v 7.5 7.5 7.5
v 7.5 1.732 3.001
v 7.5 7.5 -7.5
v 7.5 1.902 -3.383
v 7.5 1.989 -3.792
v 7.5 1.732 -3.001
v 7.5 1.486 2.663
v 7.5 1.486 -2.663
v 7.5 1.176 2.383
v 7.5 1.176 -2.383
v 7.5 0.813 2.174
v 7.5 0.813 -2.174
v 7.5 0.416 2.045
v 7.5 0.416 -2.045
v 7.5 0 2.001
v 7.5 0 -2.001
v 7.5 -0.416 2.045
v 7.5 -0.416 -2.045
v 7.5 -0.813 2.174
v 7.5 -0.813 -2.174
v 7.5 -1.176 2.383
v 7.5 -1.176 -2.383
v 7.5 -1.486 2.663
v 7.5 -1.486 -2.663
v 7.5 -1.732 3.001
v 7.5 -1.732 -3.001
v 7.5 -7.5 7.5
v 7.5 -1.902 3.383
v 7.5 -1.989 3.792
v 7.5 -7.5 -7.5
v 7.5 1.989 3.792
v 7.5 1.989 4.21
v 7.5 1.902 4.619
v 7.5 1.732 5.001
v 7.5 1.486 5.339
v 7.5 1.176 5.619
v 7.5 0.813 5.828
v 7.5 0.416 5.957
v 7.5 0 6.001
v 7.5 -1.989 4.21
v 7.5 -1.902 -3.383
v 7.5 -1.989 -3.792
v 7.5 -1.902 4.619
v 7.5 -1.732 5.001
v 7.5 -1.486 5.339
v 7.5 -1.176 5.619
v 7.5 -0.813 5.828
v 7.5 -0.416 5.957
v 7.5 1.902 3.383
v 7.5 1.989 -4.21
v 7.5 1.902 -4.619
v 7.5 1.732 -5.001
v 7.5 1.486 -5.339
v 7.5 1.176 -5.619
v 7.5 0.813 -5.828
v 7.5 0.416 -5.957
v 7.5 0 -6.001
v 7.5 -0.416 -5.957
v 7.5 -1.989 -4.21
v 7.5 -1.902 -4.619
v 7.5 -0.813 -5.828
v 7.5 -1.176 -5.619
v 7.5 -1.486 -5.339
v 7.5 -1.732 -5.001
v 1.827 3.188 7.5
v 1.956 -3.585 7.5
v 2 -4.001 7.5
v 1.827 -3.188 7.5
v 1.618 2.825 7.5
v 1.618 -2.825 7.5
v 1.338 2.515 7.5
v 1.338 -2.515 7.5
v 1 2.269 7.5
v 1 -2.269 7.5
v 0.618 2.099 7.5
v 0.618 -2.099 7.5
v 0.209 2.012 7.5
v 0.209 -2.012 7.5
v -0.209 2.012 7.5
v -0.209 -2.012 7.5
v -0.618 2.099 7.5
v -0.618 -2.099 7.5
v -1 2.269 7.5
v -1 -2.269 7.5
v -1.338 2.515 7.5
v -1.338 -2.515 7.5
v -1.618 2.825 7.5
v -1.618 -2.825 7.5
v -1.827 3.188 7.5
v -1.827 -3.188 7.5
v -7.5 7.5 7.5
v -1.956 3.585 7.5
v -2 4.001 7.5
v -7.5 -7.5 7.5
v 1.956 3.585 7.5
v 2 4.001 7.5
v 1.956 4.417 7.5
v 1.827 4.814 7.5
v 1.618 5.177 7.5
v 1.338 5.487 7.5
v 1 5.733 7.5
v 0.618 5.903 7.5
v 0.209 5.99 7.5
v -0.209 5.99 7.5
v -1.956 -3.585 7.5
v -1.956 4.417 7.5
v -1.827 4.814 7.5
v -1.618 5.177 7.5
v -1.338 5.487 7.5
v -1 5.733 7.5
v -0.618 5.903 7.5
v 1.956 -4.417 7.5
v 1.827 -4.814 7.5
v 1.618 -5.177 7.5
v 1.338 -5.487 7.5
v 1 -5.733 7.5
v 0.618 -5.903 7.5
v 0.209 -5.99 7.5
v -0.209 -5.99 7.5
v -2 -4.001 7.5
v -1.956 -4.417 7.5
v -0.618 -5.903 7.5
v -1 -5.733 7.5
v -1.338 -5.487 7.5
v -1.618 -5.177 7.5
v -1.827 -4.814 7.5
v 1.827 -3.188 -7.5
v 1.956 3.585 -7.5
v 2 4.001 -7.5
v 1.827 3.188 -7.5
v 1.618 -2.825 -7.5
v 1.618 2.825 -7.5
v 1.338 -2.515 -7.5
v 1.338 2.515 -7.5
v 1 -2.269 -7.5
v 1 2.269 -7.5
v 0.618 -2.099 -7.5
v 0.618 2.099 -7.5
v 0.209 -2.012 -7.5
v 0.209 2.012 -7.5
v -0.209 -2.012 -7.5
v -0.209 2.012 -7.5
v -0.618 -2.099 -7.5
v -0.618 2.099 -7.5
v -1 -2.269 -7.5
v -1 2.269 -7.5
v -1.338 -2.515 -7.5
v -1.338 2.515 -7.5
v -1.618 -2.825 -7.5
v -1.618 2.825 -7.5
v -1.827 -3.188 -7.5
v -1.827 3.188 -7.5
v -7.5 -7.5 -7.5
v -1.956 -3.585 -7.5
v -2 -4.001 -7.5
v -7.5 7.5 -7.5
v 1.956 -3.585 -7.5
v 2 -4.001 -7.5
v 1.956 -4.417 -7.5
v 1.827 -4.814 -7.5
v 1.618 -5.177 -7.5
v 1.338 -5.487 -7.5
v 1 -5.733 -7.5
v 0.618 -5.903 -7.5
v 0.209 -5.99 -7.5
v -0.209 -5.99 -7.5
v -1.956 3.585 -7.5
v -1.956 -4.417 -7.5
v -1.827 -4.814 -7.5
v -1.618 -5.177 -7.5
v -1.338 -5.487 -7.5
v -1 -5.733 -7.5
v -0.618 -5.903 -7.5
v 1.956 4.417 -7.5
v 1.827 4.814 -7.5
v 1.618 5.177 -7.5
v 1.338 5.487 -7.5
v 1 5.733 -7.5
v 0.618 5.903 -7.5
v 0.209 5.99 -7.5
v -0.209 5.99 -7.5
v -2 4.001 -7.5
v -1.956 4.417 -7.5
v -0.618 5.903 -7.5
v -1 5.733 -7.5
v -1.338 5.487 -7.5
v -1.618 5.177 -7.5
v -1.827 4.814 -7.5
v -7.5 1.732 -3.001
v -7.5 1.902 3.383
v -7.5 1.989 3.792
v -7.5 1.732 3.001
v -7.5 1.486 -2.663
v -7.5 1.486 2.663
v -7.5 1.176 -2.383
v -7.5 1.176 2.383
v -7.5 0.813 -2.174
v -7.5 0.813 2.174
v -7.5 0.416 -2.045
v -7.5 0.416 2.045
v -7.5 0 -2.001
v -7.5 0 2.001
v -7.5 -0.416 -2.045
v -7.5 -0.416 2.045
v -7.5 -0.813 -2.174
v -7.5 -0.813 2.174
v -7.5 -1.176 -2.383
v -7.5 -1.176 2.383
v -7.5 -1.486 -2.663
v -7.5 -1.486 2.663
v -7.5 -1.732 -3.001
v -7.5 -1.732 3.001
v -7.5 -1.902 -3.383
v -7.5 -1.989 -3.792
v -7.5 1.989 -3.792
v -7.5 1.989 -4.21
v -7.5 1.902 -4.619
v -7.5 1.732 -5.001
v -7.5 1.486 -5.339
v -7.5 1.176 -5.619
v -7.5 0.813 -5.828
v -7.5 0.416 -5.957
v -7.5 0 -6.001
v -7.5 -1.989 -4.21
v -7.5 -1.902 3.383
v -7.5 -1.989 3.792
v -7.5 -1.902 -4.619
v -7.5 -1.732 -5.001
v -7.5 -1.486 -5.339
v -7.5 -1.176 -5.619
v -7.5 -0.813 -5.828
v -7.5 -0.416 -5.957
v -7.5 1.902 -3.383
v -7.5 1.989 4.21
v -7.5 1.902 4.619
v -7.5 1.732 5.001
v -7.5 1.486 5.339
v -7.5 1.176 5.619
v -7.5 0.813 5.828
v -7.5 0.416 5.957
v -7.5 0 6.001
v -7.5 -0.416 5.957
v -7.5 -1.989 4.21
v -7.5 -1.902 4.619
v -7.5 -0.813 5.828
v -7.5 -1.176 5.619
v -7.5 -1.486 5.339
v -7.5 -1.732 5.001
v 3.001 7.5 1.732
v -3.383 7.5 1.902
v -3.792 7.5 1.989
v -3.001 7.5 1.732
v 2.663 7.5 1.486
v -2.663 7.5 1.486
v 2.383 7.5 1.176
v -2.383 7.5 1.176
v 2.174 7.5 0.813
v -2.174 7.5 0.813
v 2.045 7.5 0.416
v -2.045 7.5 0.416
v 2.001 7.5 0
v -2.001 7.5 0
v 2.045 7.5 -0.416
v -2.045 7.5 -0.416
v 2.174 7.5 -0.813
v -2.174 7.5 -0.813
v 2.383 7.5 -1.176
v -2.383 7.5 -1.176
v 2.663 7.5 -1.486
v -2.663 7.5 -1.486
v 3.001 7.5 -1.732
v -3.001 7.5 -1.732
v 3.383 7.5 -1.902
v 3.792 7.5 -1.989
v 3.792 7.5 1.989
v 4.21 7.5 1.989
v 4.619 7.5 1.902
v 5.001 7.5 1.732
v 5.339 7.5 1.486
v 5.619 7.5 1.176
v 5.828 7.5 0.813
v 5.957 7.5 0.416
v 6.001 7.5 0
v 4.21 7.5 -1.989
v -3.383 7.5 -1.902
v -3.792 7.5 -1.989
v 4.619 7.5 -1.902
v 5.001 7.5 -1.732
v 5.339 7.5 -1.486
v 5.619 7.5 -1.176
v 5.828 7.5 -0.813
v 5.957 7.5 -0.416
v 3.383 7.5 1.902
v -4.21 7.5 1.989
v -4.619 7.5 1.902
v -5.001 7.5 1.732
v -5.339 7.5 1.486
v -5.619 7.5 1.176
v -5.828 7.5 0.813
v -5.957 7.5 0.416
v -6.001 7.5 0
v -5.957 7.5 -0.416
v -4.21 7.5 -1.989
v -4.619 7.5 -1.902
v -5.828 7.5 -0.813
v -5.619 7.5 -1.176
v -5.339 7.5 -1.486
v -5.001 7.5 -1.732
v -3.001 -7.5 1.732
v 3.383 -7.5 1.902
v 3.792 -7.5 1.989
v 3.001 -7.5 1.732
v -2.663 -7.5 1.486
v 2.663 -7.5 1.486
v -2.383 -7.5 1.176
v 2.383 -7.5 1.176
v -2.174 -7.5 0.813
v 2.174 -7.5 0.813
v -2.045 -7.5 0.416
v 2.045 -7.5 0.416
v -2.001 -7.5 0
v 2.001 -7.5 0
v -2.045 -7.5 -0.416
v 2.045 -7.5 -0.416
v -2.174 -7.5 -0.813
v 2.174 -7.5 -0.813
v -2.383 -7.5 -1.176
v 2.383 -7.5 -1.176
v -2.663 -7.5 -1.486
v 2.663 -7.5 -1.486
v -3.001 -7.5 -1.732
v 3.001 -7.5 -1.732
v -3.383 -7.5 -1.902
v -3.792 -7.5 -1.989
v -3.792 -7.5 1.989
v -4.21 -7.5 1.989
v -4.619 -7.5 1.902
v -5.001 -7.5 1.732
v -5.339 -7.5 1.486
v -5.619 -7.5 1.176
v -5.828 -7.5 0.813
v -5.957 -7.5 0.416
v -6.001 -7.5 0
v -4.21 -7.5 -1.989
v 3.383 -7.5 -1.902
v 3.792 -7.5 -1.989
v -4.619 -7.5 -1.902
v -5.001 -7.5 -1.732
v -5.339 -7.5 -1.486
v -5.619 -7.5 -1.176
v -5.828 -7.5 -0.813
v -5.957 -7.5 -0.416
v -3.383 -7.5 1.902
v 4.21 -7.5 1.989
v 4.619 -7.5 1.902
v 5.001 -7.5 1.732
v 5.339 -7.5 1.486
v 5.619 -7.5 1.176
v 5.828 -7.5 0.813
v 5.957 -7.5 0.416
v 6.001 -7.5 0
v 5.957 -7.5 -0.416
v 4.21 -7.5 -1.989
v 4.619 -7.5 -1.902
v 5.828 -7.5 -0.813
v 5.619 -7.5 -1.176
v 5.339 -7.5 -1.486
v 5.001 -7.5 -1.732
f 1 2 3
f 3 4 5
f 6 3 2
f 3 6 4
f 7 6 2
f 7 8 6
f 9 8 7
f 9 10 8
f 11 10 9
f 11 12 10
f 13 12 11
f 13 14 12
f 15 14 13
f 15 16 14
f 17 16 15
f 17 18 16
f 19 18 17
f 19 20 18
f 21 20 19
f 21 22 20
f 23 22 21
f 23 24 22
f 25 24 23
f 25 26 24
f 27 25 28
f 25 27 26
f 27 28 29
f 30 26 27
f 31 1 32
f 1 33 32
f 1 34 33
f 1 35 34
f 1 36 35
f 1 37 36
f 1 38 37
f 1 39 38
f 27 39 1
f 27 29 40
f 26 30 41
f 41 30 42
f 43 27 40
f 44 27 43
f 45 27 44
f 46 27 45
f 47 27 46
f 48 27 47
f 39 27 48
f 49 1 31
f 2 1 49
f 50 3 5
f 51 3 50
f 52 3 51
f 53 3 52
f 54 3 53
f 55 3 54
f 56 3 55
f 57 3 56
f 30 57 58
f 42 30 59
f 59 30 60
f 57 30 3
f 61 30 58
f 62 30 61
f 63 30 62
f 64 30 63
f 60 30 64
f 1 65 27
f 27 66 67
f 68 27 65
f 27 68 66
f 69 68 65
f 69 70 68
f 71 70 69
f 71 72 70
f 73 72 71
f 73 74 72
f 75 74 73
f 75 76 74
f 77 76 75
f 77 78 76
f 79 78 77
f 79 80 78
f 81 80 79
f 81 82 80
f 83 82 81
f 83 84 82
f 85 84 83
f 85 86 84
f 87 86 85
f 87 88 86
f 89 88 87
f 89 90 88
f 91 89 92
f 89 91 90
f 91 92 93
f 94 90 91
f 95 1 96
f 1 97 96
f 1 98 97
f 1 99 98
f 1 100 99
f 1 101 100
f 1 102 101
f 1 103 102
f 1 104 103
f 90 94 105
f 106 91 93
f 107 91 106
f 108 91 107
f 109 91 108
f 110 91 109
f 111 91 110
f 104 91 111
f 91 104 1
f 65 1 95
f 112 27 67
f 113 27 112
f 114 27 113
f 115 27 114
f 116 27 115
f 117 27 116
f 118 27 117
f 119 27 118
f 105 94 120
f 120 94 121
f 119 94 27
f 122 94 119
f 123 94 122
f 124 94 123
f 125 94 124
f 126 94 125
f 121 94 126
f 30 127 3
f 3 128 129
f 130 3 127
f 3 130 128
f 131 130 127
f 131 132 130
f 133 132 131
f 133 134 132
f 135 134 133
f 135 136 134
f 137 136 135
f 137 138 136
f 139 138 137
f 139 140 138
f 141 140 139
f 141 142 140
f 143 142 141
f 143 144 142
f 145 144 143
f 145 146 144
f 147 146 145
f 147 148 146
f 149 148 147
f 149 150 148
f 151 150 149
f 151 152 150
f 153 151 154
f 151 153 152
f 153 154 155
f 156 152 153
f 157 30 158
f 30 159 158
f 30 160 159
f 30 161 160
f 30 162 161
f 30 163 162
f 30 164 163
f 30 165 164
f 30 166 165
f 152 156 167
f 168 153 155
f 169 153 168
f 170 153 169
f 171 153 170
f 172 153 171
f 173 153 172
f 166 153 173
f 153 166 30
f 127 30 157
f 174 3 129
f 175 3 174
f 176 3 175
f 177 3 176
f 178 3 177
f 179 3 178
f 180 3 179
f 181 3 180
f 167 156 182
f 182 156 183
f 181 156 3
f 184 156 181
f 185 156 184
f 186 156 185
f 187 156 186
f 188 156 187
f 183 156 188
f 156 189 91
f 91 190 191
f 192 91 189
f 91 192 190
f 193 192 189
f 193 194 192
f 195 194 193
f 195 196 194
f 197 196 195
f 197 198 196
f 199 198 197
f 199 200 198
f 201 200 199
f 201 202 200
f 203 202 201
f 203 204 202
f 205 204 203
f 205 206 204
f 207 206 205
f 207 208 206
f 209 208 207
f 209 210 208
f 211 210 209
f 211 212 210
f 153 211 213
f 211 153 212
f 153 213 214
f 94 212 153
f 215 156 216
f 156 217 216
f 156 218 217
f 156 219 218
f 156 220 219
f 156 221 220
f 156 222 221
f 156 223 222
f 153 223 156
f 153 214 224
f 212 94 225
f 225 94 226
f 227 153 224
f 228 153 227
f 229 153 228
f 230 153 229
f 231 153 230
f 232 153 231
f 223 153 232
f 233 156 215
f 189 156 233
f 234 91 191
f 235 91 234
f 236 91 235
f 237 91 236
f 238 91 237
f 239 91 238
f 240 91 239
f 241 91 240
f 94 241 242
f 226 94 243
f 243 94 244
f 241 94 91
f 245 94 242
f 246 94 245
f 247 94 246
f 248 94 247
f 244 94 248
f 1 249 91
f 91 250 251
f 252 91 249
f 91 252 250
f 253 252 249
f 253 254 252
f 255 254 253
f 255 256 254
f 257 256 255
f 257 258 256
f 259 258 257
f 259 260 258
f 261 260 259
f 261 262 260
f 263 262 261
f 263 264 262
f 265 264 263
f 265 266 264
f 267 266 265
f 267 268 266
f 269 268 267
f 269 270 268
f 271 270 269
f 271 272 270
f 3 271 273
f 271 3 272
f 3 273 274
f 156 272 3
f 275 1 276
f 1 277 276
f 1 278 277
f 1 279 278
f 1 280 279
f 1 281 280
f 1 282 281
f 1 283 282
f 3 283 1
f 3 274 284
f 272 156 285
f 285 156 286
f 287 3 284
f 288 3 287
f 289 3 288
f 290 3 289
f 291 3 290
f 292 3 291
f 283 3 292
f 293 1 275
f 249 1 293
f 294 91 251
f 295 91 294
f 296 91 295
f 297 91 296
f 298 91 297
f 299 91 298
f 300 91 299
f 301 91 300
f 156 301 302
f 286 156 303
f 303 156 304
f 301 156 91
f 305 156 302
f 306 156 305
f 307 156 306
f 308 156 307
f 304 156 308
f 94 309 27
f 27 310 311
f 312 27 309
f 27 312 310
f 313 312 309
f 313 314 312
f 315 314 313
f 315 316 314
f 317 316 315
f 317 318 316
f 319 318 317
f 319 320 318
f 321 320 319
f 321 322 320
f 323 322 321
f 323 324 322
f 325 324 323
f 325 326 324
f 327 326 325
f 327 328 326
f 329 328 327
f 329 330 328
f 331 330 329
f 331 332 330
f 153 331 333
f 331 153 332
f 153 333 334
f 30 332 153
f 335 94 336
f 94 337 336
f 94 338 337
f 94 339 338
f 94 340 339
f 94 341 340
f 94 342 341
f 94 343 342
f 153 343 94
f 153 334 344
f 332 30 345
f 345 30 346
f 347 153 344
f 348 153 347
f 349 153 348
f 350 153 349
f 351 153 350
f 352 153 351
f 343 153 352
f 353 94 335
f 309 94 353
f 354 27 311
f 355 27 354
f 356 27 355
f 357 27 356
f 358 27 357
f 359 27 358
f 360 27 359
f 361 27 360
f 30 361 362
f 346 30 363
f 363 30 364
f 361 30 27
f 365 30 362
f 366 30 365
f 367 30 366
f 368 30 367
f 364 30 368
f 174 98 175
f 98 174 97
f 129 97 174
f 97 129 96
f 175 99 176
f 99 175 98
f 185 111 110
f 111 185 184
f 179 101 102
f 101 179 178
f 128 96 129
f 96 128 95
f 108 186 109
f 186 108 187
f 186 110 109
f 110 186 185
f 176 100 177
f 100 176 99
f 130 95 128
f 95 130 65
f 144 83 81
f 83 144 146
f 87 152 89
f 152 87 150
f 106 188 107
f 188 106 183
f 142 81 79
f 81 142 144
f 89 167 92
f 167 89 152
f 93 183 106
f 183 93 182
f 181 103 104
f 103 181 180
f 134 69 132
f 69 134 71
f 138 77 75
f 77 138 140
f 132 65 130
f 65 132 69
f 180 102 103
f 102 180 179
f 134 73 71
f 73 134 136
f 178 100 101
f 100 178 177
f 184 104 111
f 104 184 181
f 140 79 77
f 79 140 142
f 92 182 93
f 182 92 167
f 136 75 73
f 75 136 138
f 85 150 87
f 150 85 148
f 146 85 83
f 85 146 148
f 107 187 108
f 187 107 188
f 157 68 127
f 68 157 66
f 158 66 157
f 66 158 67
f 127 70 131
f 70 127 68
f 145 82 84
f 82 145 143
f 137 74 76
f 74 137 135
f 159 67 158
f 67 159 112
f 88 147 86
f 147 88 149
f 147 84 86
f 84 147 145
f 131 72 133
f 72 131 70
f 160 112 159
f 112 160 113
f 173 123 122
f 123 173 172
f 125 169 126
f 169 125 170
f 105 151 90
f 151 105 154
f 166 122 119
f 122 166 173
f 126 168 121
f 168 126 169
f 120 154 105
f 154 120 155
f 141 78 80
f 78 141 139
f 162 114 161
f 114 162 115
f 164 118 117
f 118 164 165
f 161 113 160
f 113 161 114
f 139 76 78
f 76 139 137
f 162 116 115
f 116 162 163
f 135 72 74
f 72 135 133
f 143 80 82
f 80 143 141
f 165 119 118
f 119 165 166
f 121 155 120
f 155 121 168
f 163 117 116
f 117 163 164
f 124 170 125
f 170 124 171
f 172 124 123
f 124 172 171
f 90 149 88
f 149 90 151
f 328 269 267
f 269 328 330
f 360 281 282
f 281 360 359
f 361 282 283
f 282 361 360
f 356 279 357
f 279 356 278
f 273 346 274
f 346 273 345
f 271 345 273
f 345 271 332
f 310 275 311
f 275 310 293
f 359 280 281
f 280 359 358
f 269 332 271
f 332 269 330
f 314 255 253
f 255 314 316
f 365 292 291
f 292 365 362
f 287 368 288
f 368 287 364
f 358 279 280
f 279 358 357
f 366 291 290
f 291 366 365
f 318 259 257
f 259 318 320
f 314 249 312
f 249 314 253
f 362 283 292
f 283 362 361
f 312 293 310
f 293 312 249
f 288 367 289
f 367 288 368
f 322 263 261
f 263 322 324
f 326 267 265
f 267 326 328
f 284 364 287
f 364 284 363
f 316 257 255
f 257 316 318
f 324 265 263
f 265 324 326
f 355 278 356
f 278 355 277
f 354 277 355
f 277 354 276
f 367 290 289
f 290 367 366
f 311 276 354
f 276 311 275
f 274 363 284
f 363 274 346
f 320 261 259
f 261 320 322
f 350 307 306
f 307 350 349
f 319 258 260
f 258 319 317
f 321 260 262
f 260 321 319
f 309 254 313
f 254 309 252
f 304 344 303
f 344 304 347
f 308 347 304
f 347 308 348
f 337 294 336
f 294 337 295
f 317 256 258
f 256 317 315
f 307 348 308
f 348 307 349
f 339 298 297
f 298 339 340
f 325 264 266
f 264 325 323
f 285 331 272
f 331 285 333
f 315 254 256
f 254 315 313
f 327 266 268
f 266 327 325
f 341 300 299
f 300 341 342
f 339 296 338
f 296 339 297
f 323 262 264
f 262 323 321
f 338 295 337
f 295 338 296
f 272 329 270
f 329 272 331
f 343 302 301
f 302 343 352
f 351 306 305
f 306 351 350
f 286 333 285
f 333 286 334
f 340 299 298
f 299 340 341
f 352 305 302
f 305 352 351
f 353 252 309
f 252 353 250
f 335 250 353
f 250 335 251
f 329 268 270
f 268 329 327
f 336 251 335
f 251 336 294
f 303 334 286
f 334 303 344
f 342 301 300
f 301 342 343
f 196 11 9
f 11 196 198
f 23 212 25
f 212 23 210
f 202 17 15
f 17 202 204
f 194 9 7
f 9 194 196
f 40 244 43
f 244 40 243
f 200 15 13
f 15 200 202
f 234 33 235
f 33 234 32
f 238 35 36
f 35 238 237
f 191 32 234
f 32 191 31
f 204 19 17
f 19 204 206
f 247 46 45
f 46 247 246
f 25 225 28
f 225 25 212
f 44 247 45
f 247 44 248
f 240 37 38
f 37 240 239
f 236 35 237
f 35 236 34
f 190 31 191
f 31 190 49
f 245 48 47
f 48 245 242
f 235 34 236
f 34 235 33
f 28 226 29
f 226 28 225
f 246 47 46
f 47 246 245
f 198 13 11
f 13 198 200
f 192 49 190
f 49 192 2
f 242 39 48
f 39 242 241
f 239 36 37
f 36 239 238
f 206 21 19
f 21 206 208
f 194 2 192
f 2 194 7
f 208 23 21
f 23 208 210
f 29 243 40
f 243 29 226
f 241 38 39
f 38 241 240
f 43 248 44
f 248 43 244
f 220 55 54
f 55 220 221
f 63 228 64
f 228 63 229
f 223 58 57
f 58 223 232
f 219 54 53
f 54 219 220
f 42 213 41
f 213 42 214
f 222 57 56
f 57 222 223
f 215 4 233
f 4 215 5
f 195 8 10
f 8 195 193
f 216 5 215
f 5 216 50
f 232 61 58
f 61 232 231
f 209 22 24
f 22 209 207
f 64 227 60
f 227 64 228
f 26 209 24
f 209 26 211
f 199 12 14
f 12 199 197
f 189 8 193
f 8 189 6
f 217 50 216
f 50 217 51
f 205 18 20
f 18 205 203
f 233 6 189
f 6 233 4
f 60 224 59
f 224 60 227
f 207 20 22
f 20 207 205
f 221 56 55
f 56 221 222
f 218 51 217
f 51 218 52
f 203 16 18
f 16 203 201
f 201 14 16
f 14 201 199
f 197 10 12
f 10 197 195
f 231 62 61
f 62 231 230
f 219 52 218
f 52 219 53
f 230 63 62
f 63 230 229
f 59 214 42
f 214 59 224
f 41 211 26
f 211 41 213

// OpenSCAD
// length of edge of cube in mm
size = 15;
// hole diameter in mm
hole = 4;

$fs = 0.2;

module burr_cube()
{  
  module rotcy(rot, r, h, shift) {
    translate(shift) 
        rotate(90, rot)
            cylinder(r = r, h = h, center = true);
  }
  
  cy_r = hole/2;
  cy_h = (size * 1.1);
  x = hole + 0.001;
  
  difference() {
    cube(size = size, center = true);
    rotcy([0, 0, 0], cy_r, cy_h, [0, x, 0]);
    rotcy([0, 0, 0], cy_r, cy_h, [0, -x, 0]);
      
    rotcy([1, 0, 0], cy_r, cy_h, [x, 0, 0]);
    rotcy([1, 0, 0], cy_r, cy_h, [-x, 0, 0]);  
      
    rotcy([0, 1, 0], cy_r, cy_h, [0, 0, x]);
    rotcy([0, 1, 0], cy_r, cy_h, [0, 0, -x]);  
  }

}

burr_cube();
